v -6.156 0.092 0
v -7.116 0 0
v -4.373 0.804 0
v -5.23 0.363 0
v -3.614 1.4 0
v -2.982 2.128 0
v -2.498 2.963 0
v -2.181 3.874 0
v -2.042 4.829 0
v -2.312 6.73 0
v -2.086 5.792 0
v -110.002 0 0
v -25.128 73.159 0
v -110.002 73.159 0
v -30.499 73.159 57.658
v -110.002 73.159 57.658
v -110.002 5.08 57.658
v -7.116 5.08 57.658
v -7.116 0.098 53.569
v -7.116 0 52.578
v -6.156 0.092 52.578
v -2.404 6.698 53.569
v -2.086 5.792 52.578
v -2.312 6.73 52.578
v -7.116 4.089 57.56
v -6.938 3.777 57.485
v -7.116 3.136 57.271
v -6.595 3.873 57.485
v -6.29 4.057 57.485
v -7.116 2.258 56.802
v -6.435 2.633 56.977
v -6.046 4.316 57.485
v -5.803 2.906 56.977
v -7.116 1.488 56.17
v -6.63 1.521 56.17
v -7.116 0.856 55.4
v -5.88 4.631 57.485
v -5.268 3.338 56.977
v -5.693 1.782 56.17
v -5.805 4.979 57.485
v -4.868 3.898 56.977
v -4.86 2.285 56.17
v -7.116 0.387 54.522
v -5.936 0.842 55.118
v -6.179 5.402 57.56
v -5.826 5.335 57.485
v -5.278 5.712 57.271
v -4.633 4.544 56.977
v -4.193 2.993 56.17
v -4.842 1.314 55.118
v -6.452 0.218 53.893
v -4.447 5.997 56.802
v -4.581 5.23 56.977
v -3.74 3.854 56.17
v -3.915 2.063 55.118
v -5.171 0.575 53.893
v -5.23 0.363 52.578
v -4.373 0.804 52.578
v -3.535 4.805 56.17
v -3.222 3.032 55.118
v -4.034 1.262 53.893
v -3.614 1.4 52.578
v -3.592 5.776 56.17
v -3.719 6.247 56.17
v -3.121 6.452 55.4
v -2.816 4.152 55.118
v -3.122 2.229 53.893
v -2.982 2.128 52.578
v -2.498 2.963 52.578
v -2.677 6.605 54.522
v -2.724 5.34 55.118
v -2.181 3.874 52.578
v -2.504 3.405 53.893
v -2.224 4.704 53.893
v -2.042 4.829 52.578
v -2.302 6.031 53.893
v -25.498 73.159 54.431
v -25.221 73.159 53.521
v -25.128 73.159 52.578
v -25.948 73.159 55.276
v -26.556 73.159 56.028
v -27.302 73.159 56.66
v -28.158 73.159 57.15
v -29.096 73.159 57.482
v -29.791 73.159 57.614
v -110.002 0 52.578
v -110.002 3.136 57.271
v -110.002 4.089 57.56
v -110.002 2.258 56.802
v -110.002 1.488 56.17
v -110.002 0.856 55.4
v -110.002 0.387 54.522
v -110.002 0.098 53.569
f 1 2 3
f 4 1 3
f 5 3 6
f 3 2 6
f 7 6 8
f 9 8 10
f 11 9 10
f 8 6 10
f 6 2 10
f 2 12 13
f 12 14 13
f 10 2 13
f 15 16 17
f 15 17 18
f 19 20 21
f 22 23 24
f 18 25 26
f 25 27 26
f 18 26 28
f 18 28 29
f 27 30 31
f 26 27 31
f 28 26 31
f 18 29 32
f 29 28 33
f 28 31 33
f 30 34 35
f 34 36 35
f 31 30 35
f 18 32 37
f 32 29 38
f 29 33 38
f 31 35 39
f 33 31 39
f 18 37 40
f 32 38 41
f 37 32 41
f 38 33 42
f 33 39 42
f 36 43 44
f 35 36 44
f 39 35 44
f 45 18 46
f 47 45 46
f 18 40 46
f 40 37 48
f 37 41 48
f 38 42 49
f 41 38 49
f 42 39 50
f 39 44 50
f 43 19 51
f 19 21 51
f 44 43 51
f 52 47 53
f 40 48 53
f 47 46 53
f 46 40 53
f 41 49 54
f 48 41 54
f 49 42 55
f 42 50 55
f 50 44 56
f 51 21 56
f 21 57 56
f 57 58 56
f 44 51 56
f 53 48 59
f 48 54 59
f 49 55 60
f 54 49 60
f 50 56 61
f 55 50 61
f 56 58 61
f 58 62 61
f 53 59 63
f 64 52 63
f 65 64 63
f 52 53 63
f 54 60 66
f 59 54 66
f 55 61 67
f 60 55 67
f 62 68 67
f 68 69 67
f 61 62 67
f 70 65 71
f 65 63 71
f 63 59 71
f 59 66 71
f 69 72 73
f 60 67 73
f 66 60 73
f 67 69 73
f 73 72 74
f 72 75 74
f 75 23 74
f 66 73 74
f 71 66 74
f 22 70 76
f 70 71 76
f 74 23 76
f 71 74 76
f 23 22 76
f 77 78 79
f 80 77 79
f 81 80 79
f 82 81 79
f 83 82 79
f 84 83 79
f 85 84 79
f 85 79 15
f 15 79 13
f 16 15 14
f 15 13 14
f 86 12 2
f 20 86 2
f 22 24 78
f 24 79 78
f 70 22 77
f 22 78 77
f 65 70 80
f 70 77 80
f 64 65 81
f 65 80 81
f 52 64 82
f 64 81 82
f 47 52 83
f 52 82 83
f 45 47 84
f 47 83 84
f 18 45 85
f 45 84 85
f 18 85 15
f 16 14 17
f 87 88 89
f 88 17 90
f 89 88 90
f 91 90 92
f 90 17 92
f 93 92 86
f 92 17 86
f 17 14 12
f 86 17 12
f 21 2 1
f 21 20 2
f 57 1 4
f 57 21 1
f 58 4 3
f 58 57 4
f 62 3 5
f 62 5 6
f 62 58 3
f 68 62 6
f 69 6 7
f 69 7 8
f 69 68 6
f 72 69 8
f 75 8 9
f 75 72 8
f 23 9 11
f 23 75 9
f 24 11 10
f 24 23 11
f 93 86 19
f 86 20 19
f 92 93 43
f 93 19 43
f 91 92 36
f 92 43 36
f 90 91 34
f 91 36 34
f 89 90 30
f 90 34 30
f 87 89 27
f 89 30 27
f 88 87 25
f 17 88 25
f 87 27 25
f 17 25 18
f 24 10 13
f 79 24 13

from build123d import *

# Parameters (mm, degrees)
F1_DEPTH = 57.658
F2_R     = 5.08


with BuildPart() as f1:
    # F0 (on Top) → F1 (new body)
    with BuildSketch(Plane.XY):
        Polygon((-110.002019, 0), (0, 0), (-25.127783, 73.158786), (-110.002019, 73.158786), align=None)
    extrude(amount=F1_DEPTH)

    # F2
    f2_edges = [f1.edges().sort_by_distance(p)[0] for p in [
        (-55.001009, 0, 57.658),
        (-12.563892, 36.579393, 57.658),
        (0, 0, 28.829),
    ]]
    fillet(f2_edges, radius=F2_R)


solid = f1.part
